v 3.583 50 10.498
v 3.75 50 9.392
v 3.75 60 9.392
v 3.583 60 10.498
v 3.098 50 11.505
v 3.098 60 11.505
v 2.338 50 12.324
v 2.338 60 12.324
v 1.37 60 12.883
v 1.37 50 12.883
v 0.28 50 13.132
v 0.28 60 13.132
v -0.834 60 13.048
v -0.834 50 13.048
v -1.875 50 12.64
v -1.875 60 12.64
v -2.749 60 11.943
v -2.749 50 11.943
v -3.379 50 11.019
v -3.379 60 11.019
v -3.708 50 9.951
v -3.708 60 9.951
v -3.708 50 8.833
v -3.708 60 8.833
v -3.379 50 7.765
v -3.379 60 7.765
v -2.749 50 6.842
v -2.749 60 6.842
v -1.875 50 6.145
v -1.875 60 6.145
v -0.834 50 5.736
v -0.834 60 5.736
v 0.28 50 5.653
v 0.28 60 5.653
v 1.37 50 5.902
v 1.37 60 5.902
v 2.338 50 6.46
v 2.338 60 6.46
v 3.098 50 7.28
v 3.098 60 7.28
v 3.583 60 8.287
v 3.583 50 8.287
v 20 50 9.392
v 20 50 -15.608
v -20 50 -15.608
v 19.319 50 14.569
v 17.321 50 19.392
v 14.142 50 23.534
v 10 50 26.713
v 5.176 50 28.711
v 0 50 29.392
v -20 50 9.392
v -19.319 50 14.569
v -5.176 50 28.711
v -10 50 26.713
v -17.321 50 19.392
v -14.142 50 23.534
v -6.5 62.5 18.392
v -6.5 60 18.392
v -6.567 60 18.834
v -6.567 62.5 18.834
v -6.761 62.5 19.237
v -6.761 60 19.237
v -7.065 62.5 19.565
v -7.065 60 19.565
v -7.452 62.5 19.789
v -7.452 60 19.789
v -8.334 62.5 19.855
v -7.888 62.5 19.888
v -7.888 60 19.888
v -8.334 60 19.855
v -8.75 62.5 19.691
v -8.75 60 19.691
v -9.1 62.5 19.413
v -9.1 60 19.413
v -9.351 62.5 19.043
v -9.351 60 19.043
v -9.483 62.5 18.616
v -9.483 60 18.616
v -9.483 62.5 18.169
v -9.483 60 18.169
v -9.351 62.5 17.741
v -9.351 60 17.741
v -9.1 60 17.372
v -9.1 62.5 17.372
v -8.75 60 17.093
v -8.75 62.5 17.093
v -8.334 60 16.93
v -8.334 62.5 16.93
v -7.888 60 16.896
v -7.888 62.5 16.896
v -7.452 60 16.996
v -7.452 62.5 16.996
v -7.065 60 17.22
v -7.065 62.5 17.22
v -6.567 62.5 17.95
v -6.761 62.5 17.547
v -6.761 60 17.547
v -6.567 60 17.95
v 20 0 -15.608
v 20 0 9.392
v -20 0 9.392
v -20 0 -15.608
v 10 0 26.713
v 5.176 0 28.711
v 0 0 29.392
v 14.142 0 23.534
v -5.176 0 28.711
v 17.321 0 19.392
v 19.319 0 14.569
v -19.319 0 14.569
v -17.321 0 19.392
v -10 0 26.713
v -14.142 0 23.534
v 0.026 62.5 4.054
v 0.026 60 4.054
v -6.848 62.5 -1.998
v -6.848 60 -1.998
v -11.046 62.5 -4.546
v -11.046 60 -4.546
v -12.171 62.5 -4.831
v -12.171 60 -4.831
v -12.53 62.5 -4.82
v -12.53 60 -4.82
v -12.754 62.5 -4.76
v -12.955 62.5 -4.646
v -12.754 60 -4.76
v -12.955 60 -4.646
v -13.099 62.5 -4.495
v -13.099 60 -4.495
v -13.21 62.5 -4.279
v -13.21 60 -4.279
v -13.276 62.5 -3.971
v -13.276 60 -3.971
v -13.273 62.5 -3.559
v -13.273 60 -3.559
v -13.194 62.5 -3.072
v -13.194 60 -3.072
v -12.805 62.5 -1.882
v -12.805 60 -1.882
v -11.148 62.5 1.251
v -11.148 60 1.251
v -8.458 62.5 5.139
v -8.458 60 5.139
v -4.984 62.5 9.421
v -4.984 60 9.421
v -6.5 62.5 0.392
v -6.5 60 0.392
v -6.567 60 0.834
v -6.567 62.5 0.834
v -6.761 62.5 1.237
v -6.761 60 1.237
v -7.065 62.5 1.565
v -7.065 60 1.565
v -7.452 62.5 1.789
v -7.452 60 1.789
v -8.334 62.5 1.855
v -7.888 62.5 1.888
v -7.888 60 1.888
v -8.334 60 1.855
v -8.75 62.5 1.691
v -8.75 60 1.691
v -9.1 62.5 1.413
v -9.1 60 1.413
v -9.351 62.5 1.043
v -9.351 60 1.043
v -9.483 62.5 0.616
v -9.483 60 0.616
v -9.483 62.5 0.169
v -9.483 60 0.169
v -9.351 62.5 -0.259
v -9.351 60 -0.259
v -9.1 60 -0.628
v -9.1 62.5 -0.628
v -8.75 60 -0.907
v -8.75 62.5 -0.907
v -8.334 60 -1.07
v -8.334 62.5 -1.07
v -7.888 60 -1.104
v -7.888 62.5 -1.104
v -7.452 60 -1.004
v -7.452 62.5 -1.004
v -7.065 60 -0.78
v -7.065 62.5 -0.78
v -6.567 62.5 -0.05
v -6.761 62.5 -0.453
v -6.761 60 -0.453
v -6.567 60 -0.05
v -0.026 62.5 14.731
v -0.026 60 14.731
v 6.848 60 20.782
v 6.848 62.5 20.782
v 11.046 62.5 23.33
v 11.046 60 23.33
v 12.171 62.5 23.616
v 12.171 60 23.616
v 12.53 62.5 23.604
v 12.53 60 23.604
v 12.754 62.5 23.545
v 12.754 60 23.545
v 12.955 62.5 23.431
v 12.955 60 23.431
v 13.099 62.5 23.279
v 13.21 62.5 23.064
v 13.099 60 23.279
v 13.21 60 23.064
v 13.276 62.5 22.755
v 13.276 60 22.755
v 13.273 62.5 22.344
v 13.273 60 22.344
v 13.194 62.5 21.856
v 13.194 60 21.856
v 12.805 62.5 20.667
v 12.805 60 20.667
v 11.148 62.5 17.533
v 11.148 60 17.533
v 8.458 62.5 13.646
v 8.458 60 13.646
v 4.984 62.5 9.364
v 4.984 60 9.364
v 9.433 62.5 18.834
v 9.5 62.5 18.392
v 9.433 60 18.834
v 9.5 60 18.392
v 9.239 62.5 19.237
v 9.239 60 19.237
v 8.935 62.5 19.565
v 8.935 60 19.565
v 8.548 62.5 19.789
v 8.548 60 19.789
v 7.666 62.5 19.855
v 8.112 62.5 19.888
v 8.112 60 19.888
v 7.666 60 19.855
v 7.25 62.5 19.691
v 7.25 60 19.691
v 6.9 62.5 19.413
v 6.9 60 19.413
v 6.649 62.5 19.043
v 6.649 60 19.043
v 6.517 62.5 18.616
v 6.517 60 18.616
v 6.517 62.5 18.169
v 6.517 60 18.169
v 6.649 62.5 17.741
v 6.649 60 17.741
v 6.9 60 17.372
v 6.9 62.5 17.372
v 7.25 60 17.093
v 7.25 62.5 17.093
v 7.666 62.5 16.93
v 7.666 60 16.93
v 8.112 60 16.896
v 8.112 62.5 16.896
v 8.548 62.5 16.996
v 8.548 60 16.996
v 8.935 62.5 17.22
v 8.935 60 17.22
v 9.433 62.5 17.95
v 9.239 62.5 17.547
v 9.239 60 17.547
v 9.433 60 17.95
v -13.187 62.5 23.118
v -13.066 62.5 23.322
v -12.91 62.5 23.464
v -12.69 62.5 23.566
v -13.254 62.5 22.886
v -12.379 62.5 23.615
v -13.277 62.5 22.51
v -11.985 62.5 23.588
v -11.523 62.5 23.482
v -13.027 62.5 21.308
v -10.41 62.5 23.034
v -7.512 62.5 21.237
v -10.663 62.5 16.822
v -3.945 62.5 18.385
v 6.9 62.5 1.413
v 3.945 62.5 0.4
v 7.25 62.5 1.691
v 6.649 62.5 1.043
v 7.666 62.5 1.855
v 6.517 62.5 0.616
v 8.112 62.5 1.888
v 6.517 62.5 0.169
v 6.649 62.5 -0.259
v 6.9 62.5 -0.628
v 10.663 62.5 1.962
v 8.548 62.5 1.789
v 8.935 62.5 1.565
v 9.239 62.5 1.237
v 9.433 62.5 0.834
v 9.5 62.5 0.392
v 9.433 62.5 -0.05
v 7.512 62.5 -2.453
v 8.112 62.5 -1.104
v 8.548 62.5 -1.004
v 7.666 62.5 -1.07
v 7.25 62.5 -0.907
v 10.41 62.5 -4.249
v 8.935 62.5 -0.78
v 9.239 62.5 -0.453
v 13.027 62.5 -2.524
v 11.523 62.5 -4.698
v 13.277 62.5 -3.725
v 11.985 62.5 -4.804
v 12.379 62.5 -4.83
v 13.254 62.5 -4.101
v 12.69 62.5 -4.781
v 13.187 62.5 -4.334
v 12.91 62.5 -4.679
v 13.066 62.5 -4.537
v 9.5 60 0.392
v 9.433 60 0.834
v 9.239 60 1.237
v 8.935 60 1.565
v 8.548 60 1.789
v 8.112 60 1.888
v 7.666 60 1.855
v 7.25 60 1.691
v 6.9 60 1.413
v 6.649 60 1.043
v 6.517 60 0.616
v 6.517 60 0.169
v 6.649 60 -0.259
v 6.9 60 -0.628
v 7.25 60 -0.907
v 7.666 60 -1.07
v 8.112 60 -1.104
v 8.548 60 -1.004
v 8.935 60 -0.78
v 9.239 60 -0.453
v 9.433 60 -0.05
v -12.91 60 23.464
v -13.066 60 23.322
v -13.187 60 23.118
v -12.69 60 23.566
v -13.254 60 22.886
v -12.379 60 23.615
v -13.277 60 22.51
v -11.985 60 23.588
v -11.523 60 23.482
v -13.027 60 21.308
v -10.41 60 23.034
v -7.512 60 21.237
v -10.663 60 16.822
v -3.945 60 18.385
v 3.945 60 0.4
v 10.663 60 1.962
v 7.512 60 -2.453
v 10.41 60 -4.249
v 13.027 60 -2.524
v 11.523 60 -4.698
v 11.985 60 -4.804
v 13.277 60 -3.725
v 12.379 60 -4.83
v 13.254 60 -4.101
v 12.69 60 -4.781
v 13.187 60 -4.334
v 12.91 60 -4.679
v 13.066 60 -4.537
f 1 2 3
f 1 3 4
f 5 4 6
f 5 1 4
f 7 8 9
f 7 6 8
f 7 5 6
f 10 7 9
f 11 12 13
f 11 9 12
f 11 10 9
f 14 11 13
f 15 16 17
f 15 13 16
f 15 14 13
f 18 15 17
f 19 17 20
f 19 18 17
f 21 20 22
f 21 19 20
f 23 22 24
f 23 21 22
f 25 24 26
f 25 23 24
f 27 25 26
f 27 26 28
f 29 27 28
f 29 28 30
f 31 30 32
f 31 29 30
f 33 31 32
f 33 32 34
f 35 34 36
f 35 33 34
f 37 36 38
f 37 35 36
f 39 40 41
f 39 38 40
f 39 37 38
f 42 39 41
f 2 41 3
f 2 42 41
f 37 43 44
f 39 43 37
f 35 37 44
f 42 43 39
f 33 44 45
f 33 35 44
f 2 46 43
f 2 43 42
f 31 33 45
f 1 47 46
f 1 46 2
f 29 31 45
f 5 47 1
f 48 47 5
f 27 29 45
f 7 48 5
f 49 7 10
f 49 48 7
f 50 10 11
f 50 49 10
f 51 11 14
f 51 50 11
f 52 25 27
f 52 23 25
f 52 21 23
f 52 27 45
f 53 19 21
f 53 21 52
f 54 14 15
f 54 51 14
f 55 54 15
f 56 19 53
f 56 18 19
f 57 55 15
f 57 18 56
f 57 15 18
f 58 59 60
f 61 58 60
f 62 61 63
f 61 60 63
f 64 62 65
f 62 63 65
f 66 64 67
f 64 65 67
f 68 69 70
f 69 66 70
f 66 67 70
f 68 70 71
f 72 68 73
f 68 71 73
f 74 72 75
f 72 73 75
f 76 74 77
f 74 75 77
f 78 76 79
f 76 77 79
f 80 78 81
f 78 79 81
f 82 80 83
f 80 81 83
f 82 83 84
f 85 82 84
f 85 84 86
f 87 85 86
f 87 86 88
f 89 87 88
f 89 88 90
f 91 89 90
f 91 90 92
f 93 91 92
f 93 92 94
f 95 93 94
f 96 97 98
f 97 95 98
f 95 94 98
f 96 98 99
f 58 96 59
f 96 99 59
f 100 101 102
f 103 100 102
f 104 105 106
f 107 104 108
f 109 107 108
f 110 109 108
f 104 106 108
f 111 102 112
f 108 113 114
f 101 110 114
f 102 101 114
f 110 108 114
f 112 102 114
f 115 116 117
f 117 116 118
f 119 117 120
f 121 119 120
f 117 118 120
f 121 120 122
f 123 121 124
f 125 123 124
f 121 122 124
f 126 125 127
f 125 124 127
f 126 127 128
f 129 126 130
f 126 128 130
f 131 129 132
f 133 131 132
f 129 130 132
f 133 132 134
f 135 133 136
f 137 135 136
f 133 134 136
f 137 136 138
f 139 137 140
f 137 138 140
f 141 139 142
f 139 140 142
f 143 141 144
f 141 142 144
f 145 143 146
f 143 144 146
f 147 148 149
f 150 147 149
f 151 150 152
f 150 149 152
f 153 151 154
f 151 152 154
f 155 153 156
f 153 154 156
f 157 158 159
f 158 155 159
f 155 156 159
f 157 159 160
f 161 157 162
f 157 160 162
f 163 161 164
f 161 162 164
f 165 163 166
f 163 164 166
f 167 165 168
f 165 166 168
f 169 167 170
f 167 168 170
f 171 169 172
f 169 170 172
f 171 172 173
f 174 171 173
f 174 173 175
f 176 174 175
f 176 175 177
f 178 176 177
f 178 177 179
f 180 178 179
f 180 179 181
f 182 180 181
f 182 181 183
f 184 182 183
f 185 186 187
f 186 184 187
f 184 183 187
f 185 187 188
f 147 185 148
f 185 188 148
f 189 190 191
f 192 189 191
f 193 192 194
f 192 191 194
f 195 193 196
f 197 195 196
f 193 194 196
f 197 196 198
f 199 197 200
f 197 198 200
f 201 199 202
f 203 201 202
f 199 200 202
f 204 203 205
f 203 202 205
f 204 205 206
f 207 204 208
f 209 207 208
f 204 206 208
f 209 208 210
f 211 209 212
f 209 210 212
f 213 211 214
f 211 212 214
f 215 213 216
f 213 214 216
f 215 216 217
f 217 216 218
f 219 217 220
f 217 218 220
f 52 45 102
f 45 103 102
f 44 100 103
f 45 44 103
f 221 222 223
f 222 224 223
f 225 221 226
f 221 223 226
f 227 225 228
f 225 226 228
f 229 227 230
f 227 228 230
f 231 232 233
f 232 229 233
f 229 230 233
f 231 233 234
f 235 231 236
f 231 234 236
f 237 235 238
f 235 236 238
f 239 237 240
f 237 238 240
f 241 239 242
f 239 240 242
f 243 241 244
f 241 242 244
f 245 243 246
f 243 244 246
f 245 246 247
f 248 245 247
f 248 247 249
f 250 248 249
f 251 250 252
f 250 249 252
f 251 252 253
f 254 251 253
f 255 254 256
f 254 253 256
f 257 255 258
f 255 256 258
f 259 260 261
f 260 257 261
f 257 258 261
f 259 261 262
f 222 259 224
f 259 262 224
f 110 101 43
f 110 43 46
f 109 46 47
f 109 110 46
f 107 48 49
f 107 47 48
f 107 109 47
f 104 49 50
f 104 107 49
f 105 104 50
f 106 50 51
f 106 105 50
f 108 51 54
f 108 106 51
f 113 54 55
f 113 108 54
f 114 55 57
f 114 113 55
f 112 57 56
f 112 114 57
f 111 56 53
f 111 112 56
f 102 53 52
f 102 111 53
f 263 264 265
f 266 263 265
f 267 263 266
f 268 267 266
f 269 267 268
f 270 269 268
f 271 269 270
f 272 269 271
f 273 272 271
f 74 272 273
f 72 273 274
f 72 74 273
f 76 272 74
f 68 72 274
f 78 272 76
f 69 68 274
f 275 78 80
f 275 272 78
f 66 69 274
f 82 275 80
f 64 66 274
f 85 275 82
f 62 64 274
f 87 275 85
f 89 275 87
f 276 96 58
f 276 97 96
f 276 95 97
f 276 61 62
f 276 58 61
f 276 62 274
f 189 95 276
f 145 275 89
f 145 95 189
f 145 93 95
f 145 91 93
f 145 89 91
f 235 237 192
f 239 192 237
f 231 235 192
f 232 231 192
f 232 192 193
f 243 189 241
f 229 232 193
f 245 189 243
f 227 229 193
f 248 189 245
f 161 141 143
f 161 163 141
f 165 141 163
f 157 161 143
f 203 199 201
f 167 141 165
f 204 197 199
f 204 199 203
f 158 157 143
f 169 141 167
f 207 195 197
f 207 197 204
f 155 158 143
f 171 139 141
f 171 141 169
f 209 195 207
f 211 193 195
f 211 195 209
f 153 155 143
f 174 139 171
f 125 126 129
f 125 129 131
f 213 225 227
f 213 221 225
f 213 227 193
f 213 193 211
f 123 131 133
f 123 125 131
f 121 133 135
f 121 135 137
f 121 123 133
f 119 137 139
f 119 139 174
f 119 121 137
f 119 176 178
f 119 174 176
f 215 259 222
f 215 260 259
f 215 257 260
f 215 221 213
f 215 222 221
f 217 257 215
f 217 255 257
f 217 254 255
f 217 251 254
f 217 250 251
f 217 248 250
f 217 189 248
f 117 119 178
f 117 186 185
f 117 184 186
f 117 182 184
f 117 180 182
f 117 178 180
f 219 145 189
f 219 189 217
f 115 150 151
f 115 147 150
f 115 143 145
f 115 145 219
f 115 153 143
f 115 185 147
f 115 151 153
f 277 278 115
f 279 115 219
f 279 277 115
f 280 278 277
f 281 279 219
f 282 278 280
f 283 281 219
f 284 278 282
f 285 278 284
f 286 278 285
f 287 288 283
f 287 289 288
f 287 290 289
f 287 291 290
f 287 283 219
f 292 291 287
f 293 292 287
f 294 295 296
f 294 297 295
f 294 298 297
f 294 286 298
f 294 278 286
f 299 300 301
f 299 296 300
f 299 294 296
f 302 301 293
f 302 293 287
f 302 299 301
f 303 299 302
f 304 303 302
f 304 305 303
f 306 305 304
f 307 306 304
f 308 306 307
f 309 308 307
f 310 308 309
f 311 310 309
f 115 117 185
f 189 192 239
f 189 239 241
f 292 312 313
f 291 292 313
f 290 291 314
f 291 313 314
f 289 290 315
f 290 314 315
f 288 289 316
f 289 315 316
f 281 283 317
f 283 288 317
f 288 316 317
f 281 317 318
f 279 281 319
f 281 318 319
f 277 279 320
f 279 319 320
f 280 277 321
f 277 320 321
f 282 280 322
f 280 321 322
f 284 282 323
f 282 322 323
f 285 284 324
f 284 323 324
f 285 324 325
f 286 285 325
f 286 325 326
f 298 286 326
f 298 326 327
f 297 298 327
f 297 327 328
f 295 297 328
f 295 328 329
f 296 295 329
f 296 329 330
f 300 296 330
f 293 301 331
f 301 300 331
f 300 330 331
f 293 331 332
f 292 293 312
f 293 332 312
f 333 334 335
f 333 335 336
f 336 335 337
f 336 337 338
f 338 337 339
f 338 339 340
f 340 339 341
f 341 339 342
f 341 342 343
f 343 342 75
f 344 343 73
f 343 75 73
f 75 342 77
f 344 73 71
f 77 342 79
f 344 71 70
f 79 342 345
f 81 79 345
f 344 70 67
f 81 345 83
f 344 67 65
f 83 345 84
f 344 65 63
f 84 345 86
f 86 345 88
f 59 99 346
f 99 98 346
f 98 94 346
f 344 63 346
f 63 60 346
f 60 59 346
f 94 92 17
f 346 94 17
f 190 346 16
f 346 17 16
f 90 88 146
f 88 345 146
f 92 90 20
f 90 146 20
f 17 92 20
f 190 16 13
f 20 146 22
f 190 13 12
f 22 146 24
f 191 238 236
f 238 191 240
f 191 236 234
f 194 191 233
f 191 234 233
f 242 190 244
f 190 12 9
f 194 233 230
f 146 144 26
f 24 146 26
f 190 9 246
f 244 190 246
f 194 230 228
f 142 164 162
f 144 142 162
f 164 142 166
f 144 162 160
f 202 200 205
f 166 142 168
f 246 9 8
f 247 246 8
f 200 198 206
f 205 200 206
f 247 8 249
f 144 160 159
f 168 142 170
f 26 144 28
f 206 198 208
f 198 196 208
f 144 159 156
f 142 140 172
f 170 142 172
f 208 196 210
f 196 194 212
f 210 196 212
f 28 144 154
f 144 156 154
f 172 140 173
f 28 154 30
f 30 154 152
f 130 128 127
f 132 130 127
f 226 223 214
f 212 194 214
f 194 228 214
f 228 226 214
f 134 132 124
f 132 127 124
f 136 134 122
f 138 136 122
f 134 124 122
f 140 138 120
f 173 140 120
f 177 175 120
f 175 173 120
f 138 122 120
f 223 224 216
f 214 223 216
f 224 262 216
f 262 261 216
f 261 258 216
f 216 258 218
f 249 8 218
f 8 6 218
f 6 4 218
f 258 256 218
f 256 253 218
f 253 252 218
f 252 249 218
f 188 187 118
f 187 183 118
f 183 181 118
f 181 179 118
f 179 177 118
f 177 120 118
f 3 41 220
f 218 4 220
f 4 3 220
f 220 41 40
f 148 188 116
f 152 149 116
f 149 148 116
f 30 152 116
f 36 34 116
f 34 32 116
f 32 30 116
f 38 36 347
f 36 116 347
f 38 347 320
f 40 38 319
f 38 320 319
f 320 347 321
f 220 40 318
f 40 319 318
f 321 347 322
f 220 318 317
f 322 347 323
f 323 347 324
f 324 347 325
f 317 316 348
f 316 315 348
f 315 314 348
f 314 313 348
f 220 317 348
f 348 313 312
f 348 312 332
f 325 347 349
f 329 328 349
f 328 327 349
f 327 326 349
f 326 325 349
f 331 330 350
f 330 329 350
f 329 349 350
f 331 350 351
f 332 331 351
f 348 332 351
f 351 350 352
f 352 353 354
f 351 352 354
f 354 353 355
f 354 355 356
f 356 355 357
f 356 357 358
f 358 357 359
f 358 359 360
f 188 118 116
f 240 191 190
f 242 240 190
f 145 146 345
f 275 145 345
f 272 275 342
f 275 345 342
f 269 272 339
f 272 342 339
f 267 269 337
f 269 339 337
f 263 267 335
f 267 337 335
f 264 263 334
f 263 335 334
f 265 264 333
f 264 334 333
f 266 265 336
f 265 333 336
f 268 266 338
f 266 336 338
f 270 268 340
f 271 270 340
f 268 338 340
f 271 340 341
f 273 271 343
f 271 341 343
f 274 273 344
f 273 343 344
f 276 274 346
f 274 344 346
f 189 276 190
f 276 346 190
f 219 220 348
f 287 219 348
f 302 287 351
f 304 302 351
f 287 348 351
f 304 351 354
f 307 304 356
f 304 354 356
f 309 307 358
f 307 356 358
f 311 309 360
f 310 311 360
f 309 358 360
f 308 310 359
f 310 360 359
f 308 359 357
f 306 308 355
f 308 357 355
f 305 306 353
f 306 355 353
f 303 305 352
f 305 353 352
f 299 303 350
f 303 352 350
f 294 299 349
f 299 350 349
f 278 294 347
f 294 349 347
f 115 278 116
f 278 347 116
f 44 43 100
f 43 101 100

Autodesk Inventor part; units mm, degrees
ref_plane "YZ Plane" through (0, 0, 0) normal (1, 0, 0) x (0, 1, 0)
ref_plane "XZ Plane" through (0, 0, 0) normal (0, 1, 0) x (-1, 0, 0)
ref_plane "XY Plane" through (0, 0, 0) normal (0, 0, 1) x (1, 0, 0)
sketch "Sketch1" plane through (0, 0, 0) normal (0, 1, 0) x (-1, 0, 0)
  arc A0 (20, 9.3923) -> (-20, 9.3923) centre (0, 9.3923) ccw
  line L0 (-20, -15.6077) -> (20, -15.6077)
  line L1 (20, -15.6077) -> (20, 9.3923)
  line L2 (-20, 9.3923) -> (-20, -15.6077)
  point P0 (0, 0)
  dimension "d0" = 40
extrude "Extrusion1" add sketch "Sketch1" along normal blind 50
sketch "Sketch2" plane through (0, 50, 0) normal (0, 1, 0) x (1, 0, 0)
  arc A0 (-20, -9.3923) -> (20, -9.3923) centre (0, -9.3923) ccw projected
  circle A1 centre (0, -9.3923) radius 3.75
  point P0 (0, 0)
  dimension "d4" = 7.5
extrude "Extrusion2" add sketch "Sketch2" along normal blind 10
sketch "Sketch3" plane through (0, 60, 9.3923) normal (0, 1, 0) x (1, 0, 0)
  circle A0 centre (0, 0) radius 3.75 projected
  ellipse E0 centre (0, 0) end of major axis (-13, -14) minor radius 3.6924 (-2.25, 3) -> (-3.1582, 2.0219) ccw
  ellipse E1 centre (0, 0) end of major axis (13, -14) minor radius 3.7302 (-3, -2.25) -> (-2.4658, -2.8253) ccw
  ellipse E2 centre (0, 0) end of major axis (-13, -14) minor radius 3.6924 (-4.9841, -0.0284) -> (-0.0262, -5.3386) ccw
  ellipse E3 centre (0, 0) end of major axis (-13, -14) minor radius 3.6924 (2.25, -3) -> (3.1582, -2.0219) ccw
  ellipse E4 centre (0, 0) end of major axis (-13, -14) minor radius 3.6924 (4.9841, 0.0284) -> (0.0262, 5.3386) ccw
  ellipse E5 centre (0, 0) end of major axis (13, -14) minor radius 3.7302 (-0.0262, -5.3386) -> (4.9841, 0.0284) ccw
  ellipse E6 centre (0, 0) end of major axis (13, -14) minor radius 3.7302 (3, 2.25) -> (2.4658, 2.8253) ccw
  ellipse E7 centre (0, 0) end of major axis (13, -14) minor radius 3.7302 (0.0262, 5.3386) -> (-4.9841, -0.0284) ccw
  line L0 (8, 9) -> (-8, -9) construction
  line L1 (-8, 9) -> (8, -9) construction
  circle A1 centre (-8, 9) radius 1.5
  circle A2 centre (8, 9) radius 1.5
  circle A3 centre (8, -9) radius 1.5
  circle A4 centre (-8, -9) radius 1.5
  point P0 (0, 9.3923)
  dimension "d7" = 3
  dimension "d8" = 3
  dimension "d9" = 3
  dimension "d10" = 3
extrude "Extrusion3" add sketch "Sketch3" along normal blind 2.5
sketch "Sketch4" plane through (0, 60, 9.3923) normal (0, 1, 0) x (1, 0, 0)
  circle A0 centre (0, 0) radius 3.75 projected
  point P0 (0, 9.3923)
extrude "Extrusion4" add sketch "Sketch4" along normal blind 2.5
properties part number "servo" material "Aluminum 6061, Welded"
